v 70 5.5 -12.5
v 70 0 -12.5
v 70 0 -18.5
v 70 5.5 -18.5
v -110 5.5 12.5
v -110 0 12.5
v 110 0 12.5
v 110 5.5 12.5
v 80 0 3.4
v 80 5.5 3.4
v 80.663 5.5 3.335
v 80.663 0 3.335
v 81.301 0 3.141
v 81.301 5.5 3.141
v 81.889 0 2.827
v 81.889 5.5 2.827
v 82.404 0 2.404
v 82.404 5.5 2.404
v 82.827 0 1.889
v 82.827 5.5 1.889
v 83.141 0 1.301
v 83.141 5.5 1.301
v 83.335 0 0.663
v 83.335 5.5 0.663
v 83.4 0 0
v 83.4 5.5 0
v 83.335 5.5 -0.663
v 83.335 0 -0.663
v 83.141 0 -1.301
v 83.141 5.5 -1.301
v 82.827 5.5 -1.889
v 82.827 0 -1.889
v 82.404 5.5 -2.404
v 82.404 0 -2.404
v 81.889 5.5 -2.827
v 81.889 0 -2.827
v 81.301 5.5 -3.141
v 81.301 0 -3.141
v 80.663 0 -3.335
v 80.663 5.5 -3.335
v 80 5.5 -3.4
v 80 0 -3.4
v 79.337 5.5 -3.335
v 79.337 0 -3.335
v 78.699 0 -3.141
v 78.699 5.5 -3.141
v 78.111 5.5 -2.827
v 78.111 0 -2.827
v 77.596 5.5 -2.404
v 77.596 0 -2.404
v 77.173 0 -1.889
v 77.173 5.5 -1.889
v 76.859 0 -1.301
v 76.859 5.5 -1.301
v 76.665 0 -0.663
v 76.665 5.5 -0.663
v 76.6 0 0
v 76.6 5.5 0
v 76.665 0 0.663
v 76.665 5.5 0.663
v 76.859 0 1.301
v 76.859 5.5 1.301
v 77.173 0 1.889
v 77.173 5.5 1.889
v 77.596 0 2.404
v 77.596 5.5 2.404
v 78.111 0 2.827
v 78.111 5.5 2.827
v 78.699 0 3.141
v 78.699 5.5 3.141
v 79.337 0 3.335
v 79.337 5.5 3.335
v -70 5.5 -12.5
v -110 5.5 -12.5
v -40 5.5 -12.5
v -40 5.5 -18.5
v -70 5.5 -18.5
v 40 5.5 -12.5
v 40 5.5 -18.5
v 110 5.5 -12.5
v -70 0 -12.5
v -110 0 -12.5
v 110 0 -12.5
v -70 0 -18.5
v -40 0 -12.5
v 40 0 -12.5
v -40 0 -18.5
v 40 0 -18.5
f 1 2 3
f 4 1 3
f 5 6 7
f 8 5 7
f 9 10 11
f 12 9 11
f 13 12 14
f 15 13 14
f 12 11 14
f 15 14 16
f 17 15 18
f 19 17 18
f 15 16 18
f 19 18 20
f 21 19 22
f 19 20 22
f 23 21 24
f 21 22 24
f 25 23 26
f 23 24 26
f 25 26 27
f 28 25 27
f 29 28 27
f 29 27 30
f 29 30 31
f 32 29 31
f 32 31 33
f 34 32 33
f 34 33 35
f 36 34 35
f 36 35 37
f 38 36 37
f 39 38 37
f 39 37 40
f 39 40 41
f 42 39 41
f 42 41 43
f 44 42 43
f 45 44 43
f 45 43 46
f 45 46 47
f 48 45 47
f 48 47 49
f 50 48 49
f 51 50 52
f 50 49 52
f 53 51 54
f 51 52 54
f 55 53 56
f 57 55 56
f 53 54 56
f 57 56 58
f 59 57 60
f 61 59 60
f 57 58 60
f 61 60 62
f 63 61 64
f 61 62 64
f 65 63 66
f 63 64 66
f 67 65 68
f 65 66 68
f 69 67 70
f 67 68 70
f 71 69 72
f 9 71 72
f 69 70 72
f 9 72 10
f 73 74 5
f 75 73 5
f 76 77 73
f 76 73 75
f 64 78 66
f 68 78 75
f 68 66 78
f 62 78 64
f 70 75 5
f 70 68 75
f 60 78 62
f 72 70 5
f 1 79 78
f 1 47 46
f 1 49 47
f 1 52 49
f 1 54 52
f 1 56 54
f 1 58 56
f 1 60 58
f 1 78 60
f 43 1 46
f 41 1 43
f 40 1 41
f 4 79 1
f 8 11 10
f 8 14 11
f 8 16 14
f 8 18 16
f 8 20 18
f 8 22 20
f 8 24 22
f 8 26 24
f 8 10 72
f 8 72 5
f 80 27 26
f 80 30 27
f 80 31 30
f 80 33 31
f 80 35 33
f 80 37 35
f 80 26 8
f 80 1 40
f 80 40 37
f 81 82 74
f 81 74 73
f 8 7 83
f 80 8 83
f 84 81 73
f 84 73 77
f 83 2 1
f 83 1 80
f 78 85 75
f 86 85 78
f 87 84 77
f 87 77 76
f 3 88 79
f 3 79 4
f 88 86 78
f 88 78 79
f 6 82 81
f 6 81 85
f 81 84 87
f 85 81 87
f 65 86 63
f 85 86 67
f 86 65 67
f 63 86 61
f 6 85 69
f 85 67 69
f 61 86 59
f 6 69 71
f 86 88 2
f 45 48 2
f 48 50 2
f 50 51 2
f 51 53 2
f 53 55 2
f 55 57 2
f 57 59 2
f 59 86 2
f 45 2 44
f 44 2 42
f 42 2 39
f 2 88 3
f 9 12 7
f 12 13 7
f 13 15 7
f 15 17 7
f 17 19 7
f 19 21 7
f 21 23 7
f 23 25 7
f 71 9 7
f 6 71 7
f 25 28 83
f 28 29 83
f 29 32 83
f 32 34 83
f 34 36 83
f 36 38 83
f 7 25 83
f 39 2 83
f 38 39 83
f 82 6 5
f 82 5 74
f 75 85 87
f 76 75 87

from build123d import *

# Parameters (mm, degrees)
SKETCH1_W           = 30
SKETCH1_H           = 6
SKETCH1_W_2         = 220
SKETCH1_H_2         = 25
BOSS_EXTRUDE1_DEPTH = 5.5
SKETCH3_R           = 3.4
CUT_EXTRUDE1_DEPTH  = 112.680347421


with BuildPart() as part:
    # Sketch1 → Boss-Extrude1 (new body)
    with BuildSketch(Plane(origin=(0, 0, 0), x_dir=(1, 0, 0), z_dir=(0, 1, 0))):
        with Locations((-55, 15.5)):
            Rectangle(SKETCH1_W, SKETCH1_H)
        Rectangle(SKETCH1_W_2, SKETCH1_H_2)
        with Locations((55, 15.5)):
            Rectangle(SKETCH1_W, SKETCH1_H)
    extrude(amount=BOSS_EXTRUDE1_DEPTH)

    # Sketch3 → Cut-Extrude1 (cut, through all)
    with BuildSketch(Plane(origin=(0, 5.5, 0), x_dir=(1, 0, 0), z_dir=(0, 1, 0))):
        with Locations(Location((80, 0, 0), (0, 0, 270))):
            Circle(SKETCH3_R)
    extrude(amount=-CUT_EXTRUDE1_DEPTH, mode=Mode.SUBTRACT)


solid = part.part
